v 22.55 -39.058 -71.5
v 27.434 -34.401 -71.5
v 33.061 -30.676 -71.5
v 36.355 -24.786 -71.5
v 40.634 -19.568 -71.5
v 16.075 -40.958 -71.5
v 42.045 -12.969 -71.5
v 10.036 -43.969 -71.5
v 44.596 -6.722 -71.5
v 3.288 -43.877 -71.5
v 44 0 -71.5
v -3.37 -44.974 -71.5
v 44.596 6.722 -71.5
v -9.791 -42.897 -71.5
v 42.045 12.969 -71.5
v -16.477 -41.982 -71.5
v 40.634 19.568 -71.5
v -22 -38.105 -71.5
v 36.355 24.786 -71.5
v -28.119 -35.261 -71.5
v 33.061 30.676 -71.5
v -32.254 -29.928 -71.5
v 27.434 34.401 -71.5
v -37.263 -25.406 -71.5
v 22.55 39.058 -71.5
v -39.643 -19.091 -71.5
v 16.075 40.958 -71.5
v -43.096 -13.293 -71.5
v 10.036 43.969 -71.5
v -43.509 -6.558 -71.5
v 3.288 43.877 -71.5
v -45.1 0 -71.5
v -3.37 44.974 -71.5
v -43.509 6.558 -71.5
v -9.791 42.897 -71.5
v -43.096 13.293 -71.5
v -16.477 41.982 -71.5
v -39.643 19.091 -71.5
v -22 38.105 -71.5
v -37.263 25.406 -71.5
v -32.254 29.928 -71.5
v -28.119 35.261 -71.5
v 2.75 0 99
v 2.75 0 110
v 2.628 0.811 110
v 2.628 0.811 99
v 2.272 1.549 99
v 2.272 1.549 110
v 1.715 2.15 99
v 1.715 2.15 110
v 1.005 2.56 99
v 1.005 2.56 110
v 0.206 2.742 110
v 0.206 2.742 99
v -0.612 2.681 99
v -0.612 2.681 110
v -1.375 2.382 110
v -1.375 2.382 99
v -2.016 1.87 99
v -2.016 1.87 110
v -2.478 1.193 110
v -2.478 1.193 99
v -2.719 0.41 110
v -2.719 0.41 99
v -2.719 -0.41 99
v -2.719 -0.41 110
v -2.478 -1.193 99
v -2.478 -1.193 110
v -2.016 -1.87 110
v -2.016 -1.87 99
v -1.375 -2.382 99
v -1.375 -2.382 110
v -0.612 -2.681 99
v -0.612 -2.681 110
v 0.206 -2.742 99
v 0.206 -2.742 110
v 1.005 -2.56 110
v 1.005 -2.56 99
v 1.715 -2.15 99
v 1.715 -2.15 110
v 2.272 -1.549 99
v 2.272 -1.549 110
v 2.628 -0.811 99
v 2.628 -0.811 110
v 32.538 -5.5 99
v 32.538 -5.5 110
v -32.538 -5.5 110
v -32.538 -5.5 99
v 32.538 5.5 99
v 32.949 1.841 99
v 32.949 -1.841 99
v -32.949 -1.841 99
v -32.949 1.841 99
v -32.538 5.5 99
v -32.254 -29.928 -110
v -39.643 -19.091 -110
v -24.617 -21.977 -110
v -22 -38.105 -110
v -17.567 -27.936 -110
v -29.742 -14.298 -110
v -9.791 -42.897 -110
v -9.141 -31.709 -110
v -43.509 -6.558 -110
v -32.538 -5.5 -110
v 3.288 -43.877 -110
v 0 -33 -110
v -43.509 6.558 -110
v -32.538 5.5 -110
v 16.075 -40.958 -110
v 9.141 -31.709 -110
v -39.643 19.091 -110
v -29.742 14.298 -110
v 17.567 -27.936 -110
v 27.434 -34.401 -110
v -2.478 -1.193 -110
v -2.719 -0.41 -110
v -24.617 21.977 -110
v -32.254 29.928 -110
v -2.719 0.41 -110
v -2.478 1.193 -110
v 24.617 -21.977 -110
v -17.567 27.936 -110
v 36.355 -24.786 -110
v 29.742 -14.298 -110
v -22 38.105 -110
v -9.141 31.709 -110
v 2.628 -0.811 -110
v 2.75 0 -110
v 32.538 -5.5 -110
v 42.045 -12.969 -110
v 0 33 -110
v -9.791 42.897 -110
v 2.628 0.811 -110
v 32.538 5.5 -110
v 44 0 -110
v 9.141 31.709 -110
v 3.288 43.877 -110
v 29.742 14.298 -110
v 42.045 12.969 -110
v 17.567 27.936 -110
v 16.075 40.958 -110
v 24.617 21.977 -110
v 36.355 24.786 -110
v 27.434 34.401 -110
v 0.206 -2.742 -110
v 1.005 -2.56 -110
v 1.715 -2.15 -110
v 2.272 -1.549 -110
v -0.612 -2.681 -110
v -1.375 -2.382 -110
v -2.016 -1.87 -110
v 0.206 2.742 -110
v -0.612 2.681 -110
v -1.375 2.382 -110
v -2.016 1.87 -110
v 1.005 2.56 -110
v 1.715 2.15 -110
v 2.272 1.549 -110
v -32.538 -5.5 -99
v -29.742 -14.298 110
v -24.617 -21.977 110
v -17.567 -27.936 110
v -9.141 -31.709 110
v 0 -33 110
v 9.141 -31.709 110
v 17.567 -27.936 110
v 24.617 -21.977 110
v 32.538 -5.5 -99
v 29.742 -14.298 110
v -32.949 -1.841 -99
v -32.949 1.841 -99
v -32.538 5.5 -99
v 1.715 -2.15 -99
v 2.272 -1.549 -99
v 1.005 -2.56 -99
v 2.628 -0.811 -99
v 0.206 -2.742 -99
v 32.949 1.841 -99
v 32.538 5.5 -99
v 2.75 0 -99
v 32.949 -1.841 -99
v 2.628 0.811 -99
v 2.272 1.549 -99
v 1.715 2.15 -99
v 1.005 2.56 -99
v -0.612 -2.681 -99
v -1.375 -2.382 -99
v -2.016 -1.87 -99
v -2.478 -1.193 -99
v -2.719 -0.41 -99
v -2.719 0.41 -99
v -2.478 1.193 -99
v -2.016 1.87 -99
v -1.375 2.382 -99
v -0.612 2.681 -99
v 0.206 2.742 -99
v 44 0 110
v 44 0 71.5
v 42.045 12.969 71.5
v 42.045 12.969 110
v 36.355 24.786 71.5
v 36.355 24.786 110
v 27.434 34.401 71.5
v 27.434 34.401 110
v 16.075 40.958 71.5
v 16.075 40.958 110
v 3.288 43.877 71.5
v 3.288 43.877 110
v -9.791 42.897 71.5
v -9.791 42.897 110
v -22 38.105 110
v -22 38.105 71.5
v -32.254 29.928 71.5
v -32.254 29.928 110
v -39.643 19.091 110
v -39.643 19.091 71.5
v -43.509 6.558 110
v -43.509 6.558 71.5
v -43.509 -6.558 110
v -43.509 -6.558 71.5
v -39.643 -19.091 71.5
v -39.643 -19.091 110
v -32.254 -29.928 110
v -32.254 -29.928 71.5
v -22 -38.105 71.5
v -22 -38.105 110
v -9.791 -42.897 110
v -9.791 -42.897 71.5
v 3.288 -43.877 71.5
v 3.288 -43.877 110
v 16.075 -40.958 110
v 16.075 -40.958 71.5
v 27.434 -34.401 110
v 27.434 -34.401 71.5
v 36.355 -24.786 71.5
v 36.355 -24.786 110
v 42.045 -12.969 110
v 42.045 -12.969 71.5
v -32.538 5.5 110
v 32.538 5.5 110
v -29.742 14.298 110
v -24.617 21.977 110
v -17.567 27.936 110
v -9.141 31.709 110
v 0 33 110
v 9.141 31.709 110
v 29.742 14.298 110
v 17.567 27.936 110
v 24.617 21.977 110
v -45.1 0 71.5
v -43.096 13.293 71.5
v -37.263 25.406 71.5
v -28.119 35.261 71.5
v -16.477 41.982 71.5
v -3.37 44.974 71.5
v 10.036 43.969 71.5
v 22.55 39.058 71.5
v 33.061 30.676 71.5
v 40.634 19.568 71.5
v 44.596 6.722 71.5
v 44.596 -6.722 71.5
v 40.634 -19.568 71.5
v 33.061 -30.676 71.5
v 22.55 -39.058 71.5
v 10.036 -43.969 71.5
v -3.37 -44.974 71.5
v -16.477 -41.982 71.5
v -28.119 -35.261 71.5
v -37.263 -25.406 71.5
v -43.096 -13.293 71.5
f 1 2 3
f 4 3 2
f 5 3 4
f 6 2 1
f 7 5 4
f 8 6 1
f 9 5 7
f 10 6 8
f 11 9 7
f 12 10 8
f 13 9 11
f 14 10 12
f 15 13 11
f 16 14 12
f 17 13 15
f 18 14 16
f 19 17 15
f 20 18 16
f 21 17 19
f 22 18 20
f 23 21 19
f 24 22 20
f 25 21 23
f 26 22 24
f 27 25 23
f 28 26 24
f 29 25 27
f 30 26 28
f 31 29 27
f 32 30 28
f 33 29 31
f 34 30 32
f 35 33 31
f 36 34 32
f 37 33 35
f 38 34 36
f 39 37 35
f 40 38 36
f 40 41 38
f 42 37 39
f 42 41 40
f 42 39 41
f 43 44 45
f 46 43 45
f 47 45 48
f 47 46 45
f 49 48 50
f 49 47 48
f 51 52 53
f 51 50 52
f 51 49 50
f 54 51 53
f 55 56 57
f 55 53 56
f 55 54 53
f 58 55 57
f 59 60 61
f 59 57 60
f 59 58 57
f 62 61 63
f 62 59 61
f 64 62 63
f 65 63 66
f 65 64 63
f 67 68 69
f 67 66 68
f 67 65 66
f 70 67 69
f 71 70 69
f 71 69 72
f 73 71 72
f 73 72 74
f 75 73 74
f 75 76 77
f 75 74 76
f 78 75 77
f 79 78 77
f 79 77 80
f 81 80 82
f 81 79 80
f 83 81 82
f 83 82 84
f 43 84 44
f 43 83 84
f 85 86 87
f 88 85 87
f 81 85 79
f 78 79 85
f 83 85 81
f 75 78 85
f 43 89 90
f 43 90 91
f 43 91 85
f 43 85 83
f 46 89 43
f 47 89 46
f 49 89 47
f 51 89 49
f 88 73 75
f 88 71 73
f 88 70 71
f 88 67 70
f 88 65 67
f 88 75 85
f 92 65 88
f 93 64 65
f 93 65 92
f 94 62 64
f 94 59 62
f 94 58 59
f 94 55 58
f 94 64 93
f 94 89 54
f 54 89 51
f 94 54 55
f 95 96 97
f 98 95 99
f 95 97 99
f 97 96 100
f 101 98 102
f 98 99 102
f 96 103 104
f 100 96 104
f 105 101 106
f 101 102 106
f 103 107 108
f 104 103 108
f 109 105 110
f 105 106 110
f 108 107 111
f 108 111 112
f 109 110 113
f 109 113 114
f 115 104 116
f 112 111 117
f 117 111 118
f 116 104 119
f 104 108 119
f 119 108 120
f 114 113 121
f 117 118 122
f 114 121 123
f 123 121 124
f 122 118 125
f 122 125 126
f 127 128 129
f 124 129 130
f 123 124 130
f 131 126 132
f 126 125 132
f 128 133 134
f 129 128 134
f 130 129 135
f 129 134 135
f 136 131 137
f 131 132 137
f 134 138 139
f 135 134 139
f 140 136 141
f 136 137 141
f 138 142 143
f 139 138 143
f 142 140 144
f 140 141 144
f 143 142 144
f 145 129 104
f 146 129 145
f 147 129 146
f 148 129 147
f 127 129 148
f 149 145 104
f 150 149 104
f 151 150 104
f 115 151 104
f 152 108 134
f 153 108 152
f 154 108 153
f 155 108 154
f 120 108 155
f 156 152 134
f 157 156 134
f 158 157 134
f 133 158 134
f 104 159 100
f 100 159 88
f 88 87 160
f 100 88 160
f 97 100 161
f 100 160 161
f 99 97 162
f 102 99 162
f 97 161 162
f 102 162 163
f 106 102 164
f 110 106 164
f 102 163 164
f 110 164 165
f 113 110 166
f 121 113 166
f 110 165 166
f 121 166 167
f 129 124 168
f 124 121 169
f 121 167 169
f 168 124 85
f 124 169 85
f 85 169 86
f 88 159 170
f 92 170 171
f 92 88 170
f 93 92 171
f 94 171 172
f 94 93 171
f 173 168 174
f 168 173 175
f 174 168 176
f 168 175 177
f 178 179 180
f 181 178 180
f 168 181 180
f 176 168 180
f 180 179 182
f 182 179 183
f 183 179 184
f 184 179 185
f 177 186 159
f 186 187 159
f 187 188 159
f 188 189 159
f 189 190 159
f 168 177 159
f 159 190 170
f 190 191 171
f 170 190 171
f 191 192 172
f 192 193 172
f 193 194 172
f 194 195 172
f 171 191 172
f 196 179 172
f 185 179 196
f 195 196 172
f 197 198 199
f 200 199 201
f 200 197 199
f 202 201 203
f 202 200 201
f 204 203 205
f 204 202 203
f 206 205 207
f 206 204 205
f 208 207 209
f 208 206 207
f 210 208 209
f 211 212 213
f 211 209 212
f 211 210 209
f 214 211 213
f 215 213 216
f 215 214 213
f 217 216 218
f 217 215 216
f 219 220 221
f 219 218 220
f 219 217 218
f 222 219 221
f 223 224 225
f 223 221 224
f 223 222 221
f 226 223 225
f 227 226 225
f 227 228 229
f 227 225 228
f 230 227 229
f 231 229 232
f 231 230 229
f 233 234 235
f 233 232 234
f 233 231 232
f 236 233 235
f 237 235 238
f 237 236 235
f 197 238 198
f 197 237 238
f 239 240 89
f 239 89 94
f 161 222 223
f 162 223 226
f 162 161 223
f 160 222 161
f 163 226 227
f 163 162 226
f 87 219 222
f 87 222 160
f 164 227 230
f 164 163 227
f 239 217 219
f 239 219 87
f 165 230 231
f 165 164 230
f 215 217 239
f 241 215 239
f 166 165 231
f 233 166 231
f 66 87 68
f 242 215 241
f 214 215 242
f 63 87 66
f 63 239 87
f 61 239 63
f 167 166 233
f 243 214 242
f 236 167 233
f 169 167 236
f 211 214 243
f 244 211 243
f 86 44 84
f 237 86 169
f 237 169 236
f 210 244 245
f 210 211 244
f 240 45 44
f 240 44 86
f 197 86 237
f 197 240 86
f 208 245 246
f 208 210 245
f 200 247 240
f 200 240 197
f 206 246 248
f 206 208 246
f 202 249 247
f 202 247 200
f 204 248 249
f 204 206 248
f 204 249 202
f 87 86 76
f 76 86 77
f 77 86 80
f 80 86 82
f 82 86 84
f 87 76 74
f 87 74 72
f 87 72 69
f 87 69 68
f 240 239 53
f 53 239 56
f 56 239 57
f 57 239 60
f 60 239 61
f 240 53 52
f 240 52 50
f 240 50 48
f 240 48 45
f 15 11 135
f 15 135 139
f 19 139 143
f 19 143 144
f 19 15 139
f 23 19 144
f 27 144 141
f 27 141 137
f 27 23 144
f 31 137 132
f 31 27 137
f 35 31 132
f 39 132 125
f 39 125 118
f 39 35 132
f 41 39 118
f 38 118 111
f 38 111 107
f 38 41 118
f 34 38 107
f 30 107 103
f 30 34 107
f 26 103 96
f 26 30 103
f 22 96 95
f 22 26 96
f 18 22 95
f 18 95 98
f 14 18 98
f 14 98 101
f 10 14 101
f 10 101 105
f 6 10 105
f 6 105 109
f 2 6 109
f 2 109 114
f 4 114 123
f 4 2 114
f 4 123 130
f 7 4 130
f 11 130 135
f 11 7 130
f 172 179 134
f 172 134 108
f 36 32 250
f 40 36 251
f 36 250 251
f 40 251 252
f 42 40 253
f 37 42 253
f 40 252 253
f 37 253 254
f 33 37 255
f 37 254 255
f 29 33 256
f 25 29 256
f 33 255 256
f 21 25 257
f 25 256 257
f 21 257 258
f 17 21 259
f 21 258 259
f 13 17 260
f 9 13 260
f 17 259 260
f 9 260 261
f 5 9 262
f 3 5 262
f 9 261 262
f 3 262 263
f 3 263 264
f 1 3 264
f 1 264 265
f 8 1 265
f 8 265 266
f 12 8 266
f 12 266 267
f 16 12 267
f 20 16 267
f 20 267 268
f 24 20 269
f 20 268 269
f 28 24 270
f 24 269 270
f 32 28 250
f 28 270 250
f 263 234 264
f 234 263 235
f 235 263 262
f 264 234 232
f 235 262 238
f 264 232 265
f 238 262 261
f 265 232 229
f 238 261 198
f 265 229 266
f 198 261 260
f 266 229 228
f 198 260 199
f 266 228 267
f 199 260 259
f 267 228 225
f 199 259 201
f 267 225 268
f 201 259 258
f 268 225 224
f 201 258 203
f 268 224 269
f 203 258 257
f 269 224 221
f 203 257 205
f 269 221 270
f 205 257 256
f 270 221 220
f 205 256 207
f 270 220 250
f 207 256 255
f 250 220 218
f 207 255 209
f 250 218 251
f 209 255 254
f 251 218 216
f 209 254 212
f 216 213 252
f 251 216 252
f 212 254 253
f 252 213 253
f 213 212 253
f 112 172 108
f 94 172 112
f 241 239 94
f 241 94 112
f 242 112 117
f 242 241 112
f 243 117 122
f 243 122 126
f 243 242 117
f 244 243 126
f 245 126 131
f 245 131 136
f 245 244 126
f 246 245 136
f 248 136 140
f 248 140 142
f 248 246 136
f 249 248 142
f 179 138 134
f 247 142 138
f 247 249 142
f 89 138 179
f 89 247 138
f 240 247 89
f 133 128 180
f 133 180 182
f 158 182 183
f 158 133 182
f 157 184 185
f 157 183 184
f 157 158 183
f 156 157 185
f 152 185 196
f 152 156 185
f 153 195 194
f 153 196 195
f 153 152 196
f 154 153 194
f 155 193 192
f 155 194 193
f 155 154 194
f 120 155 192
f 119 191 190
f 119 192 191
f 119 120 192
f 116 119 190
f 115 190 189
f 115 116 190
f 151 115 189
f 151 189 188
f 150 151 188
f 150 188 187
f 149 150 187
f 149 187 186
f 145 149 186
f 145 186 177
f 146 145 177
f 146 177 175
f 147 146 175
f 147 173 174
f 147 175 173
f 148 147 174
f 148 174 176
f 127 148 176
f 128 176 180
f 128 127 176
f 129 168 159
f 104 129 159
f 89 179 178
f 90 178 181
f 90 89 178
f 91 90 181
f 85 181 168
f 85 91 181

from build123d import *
from build123d.topology import SkipClean

# Parameters (mm, degrees)
SKETCH1_R               = 40
BOSS_EXTRUDE1_DEPTH     = 100
CUT_EXTRUDE1_START      = -10
CUT_EXTRUDE1_DEPTH      = 180
CUT_EXTRUDE2_DEPTH      = 208.846096908
CUT_EXTRUDE2_DEPTH_BACK = 208.846096908
SKETCH3_R               = 2.5
BOSS_EXTRUDE2_START     = -165
SKETCH4_R               = 41
SKETCH4_R_2             = 40
BOSS_EXTRUDE2_DEPTH     = 130
SCALE1_SCALE            = 1.1


with BuildPart() as part:
    # Sketch1 → Boss-Extrude1 (new, symmetric)
    with BuildSketch(Plane.XY):
        Circle(SKETCH1_R)
        with BuildLine():
            Line((29.580398915, 5), (-29.580398915, 5))
            ThreePointArc((-29.580398915, 5), (0, 30), (29.580398915, 5))
        make_face(mode=Mode.SUBTRACT)
        with BuildLine():
            Line((29.580398915, -5), (-29.580398915, -5))
            ThreePointArc((-29.580398915, -5), (0, -30), (29.580398915, -5))
        make_face(mode=Mode.SUBTRACT)
    extrude(amount=BOSS_EXTRUDE1_DEPTH, both=True)

    # Sketch2 → Cut-Extrude1 (cut)
    with BuildSketch(Plane.XY.offset(100).offset(CUT_EXTRUDE1_START)):
        with BuildLine():
            Line((-29.580398915, 5), (29.580398915, 5))
            ThreePointArc((29.580398915, 5), (30, 0), (29.580398915, -5))
            Line((29.580398915, -5), (-29.580398915, -5))
            ThreePointArc((-29.580398915, -5), (-30, 0), (-29.580398915, 5))
        make_face()
    extrude(amount=-CUT_EXTRUDE1_DEPTH, mode=Mode.SUBTRACT)

    # Sketch3 → Cut-Extrude2 (cut, two sides: drawn at the far end of the back side and taken through both)
    with SkipClean():  # the faces are left unmerged after this step: merging them gives an invalid solid
        with BuildSketch(Plane.XY.offset(100).offset(-CUT_EXTRUDE2_DEPTH_BACK)):
            Circle(SKETCH3_R)
        extrude(amount=CUT_EXTRUDE2_DEPTH + CUT_EXTRUDE2_DEPTH_BACK, mode=Mode.SUBTRACT)

    # Sketch4 → Boss-Extrude2 (add)
    with SkipClean():  # the faces are left unmerged after this step: merging them gives an invalid solid
        with BuildSketch(Plane(origin=(0, 0, -100), x_dir=(-1, 0, 0), z_dir=(0, 0, -1)).offset(BOSS_EXTRUDE2_START)):
            Circle(SKETCH4_R)
            Circle(SKETCH4_R_2, mode=Mode.SUBTRACT)
        extrude(amount=BOSS_EXTRUDE2_DEPTH)


with BuildPart() as part_1:
    # Scale1: scaled about (0, 0, 0)
    add(part.part.scale(SCALE1_SCALE))


solid = part_1.part
